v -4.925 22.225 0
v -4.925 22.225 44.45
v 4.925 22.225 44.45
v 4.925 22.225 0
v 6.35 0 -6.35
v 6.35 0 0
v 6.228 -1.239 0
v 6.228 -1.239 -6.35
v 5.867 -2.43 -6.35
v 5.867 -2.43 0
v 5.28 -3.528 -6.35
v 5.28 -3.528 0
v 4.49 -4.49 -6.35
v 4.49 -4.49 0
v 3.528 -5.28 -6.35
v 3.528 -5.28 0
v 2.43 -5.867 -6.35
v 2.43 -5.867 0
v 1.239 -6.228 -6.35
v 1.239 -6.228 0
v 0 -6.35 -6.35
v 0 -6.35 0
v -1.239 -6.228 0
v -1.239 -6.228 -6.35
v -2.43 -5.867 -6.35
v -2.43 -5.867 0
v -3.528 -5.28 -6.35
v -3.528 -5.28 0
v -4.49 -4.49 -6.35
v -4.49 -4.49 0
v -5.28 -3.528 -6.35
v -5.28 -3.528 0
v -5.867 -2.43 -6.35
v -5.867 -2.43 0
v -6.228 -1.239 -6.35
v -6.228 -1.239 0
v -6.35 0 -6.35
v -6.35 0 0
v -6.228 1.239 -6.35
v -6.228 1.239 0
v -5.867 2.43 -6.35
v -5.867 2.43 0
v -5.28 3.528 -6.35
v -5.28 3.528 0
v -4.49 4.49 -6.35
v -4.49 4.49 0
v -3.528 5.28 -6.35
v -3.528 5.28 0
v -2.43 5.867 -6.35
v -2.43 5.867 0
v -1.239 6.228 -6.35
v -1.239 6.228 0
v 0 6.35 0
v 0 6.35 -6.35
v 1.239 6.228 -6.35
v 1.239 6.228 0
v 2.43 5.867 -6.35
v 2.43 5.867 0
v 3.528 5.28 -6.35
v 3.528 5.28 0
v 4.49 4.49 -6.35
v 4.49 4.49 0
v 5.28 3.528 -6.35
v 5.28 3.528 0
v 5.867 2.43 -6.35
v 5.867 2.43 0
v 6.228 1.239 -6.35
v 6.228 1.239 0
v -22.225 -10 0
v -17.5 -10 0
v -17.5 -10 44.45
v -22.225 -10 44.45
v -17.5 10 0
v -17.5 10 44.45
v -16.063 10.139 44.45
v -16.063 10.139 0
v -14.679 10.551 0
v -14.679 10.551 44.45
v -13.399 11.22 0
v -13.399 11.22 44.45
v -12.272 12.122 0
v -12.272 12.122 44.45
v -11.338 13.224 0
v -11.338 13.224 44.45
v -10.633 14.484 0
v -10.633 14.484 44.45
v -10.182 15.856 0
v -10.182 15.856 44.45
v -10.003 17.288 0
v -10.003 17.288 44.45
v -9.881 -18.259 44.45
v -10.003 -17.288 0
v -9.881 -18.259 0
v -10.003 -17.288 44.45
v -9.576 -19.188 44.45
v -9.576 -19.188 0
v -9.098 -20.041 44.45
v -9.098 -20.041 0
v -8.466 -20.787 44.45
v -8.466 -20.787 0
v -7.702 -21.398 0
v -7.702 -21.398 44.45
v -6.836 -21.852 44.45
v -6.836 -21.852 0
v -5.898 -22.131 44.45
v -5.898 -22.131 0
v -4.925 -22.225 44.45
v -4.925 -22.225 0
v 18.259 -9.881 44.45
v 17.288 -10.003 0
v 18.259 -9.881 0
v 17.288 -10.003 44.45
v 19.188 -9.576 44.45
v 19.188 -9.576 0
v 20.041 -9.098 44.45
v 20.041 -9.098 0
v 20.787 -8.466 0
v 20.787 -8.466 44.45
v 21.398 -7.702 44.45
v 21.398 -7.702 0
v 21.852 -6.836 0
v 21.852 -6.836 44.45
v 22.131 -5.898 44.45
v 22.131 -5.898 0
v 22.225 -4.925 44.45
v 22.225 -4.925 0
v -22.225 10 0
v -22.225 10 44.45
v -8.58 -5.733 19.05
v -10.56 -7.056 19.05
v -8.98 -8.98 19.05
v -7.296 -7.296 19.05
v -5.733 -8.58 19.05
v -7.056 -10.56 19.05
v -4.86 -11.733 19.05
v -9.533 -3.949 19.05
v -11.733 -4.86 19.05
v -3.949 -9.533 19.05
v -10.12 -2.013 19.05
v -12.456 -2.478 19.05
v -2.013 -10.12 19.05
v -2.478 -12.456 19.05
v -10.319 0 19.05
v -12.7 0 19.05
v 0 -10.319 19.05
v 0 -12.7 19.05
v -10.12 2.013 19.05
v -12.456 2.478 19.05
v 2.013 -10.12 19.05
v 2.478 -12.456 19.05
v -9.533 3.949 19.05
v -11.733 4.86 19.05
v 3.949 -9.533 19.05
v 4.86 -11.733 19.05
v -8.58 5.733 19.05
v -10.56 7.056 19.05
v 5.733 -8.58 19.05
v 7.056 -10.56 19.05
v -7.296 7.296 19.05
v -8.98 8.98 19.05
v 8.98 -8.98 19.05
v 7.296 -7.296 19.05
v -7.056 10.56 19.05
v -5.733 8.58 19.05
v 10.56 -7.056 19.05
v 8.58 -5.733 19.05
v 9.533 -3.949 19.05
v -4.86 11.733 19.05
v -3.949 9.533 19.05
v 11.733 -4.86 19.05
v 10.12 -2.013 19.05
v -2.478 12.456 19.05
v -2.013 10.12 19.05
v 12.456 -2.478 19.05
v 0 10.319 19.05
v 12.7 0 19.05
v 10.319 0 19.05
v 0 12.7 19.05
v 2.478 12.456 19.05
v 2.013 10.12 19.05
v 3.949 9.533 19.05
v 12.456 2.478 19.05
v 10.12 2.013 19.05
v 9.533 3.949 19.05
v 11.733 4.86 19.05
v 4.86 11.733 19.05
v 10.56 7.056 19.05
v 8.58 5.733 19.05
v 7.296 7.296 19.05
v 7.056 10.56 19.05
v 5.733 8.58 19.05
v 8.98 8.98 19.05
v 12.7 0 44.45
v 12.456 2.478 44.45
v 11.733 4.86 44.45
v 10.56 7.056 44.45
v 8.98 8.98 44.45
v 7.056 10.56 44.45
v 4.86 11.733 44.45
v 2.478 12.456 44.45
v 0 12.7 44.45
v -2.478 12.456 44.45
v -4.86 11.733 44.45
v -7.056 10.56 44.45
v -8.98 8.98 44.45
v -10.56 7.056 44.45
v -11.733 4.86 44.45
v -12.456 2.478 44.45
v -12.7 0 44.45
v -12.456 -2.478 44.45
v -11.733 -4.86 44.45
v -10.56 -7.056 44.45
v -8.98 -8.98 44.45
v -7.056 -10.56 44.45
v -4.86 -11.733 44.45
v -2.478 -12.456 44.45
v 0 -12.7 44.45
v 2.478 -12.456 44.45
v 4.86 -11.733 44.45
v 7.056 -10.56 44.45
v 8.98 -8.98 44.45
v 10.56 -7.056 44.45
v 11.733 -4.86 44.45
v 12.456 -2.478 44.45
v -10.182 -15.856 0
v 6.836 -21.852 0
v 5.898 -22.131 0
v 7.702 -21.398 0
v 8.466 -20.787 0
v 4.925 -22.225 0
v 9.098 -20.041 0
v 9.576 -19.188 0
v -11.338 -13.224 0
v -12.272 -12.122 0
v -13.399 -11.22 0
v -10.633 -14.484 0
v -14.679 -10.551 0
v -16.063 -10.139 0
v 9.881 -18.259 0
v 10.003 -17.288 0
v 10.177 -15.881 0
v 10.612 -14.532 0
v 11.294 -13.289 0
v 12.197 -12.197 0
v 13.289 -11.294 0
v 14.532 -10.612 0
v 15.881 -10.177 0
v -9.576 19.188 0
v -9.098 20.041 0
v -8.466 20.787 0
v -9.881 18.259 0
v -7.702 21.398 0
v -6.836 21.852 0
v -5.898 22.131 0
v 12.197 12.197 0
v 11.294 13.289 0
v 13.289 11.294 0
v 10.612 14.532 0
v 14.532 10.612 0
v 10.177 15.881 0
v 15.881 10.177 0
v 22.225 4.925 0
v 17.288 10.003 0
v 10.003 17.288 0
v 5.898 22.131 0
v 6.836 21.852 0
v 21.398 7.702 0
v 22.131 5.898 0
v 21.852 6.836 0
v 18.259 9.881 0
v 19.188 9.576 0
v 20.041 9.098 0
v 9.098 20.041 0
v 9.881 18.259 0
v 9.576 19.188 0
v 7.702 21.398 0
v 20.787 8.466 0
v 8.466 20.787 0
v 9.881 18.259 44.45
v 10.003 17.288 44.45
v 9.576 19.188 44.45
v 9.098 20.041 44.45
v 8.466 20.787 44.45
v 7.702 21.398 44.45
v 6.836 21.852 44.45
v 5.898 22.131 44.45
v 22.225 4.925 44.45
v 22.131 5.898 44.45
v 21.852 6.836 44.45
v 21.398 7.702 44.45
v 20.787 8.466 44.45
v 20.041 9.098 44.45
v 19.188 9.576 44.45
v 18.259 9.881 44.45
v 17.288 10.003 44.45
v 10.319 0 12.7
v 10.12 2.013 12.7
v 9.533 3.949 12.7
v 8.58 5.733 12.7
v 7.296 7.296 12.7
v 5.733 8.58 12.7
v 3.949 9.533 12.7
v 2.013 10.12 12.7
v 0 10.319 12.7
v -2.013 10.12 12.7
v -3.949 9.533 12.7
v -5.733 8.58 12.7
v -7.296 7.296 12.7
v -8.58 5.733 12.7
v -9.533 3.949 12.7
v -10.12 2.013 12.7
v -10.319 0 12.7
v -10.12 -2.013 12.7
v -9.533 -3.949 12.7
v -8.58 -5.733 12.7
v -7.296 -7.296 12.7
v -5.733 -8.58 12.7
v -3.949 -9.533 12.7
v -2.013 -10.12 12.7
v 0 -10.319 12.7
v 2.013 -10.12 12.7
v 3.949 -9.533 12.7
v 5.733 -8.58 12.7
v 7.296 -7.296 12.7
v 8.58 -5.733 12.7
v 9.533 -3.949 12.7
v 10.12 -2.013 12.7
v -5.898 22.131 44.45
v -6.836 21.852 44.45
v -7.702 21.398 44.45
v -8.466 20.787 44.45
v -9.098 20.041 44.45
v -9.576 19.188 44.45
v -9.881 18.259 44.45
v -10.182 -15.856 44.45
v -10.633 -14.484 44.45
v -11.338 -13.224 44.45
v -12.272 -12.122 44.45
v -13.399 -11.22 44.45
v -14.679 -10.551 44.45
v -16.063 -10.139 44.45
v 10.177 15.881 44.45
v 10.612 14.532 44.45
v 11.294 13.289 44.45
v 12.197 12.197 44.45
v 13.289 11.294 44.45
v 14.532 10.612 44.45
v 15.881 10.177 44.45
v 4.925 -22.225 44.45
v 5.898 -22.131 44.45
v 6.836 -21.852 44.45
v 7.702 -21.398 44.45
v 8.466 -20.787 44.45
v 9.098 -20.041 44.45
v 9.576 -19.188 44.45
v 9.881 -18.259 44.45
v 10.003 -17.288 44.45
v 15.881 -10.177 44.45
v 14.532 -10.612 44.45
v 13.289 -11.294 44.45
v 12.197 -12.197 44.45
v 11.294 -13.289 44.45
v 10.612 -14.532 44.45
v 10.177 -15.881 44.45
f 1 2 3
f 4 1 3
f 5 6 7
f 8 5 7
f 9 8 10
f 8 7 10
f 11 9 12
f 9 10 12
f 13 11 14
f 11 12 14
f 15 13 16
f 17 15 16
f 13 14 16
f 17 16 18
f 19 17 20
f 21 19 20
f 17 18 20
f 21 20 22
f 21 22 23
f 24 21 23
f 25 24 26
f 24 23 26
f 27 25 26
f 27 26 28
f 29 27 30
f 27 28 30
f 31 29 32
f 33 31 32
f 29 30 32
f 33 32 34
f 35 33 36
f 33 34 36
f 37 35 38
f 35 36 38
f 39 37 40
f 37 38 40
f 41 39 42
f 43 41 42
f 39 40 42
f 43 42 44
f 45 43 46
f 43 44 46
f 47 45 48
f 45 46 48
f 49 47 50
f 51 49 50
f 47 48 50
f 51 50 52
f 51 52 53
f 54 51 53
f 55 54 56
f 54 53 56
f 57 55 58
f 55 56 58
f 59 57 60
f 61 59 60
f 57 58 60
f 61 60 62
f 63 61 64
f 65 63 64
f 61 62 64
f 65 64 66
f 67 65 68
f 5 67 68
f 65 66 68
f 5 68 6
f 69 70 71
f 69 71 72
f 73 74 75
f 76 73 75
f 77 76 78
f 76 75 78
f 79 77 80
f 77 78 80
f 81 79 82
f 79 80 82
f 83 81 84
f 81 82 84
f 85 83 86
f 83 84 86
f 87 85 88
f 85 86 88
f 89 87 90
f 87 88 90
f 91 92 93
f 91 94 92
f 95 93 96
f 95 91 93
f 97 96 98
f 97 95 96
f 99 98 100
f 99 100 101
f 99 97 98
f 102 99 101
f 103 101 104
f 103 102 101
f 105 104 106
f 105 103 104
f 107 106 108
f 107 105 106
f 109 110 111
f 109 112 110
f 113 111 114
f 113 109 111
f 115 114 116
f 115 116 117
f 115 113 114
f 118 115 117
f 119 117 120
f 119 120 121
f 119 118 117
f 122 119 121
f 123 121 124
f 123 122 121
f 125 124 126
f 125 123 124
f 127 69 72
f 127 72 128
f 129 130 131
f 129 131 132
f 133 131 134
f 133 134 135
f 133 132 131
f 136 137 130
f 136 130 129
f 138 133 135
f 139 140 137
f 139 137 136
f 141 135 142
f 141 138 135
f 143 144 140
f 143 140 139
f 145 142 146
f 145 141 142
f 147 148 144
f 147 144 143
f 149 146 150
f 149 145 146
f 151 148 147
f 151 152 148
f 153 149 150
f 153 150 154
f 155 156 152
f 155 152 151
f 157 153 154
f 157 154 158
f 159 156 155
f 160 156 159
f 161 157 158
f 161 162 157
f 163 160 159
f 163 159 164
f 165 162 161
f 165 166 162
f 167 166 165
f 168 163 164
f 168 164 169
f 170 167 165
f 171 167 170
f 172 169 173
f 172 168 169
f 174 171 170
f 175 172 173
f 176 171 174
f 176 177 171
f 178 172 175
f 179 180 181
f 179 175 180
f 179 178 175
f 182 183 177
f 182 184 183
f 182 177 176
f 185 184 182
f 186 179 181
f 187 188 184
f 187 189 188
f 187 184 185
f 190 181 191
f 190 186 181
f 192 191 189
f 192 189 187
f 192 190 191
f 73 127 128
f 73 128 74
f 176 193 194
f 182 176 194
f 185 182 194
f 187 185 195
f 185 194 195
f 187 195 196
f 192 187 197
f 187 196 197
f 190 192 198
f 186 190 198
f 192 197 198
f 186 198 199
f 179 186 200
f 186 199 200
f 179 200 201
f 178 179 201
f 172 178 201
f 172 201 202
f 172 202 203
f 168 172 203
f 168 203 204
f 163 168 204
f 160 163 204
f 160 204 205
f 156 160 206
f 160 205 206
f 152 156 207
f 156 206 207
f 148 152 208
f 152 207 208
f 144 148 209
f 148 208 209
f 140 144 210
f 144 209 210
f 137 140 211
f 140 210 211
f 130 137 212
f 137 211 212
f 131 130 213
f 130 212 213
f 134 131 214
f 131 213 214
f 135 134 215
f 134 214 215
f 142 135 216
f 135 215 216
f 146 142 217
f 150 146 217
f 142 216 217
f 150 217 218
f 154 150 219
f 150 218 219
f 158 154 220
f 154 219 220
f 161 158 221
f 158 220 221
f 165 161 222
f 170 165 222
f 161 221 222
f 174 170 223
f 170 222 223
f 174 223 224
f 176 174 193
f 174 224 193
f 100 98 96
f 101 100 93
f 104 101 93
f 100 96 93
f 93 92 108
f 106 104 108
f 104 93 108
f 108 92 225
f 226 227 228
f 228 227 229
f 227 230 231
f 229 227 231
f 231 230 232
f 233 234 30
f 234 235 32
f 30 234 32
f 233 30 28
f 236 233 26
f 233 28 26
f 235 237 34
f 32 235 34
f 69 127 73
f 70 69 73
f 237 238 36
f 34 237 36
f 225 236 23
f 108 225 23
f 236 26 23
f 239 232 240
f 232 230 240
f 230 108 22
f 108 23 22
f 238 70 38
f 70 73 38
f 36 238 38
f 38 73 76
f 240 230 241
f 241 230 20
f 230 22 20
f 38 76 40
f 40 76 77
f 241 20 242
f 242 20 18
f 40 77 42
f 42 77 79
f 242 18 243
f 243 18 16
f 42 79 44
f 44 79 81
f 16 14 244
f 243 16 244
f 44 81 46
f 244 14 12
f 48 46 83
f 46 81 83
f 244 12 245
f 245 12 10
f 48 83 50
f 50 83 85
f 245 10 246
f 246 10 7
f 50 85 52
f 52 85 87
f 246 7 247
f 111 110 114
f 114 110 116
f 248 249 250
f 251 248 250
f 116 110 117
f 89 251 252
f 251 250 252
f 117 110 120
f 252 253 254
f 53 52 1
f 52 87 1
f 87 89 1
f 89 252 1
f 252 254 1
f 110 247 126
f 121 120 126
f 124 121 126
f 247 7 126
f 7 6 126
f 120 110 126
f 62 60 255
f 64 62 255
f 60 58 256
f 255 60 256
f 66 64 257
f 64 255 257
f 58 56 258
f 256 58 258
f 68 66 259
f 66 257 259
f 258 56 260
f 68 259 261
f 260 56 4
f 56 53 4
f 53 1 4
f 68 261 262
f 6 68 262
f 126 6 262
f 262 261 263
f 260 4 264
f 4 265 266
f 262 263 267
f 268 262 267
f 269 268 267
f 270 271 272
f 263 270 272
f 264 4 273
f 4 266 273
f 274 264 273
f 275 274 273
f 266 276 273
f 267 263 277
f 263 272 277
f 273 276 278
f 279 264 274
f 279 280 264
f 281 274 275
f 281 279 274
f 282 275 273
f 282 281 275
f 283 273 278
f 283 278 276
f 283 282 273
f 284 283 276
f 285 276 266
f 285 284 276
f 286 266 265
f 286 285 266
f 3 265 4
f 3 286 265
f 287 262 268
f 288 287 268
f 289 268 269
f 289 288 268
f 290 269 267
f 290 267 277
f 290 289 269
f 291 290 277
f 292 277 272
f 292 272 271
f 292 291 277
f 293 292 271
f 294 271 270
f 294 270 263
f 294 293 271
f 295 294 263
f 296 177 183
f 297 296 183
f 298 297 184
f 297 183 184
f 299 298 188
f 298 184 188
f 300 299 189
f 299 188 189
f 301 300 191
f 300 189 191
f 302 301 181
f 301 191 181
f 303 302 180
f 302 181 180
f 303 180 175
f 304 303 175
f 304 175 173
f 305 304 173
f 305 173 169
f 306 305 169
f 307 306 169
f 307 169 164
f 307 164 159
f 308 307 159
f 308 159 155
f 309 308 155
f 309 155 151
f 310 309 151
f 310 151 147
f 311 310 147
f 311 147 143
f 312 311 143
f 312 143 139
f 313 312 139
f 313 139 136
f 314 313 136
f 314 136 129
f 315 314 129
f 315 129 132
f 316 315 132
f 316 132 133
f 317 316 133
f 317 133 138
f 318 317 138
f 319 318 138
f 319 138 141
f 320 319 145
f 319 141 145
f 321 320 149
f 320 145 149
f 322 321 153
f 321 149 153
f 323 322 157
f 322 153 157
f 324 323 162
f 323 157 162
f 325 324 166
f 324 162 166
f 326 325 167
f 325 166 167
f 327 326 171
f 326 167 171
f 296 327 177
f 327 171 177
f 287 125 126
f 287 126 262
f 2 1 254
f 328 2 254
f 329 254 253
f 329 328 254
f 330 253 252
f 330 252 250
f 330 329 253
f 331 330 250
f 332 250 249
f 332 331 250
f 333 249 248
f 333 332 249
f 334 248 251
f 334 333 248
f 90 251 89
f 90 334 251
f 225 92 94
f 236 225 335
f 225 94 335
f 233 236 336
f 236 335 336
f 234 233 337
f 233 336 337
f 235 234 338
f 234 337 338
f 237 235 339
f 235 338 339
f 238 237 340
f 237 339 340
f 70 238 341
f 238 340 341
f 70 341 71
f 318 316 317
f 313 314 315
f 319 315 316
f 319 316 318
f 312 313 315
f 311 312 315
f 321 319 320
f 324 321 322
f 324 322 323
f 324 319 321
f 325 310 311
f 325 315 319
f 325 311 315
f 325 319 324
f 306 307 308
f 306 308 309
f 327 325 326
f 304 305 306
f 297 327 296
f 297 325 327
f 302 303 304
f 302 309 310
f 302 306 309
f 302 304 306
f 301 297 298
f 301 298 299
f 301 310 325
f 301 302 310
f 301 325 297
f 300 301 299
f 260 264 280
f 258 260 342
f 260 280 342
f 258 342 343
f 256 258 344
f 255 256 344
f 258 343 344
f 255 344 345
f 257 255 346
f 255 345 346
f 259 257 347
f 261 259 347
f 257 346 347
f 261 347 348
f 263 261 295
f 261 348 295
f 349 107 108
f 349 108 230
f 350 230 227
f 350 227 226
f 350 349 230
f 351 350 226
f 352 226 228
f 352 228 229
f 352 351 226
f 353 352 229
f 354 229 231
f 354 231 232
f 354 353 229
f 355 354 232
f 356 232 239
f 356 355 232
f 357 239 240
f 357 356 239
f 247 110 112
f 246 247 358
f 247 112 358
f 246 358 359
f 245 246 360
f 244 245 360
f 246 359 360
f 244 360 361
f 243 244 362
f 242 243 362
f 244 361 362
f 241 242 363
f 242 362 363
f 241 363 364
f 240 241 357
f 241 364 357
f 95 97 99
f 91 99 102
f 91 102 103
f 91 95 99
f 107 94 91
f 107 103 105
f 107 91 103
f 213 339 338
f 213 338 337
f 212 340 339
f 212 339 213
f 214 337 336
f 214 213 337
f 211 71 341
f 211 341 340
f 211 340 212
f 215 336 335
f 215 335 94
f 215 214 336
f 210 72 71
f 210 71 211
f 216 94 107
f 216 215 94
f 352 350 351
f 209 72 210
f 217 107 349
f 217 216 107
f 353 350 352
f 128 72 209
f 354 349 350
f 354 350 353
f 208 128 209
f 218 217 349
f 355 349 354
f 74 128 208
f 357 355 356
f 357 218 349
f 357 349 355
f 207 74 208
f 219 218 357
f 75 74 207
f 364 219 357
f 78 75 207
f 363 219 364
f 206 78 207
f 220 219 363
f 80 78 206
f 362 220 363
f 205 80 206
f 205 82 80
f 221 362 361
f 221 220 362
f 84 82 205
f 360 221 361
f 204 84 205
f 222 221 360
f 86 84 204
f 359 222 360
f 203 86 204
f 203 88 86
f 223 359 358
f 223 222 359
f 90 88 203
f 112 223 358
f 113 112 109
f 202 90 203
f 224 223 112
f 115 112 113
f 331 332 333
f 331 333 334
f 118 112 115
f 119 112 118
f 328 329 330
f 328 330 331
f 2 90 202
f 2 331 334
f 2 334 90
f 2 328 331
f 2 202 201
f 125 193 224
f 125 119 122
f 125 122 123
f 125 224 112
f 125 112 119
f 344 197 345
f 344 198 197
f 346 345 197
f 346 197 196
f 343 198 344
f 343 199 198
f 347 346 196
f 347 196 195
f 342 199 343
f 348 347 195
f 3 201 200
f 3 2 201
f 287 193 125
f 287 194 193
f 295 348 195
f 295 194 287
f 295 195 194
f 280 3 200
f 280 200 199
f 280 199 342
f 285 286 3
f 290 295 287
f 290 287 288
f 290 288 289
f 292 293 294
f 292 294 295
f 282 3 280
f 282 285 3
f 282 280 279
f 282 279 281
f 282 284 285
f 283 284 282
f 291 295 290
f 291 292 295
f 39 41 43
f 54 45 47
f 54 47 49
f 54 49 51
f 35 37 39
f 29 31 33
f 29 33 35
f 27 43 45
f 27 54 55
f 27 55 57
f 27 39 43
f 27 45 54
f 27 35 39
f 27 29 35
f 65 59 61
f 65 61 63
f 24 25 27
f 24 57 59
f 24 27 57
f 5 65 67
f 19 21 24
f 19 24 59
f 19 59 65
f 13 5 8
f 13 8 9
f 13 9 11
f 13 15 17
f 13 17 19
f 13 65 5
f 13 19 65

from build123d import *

# Parameters (mm, degrees)
F0_W      = 44.45
F0_H      = 44.45
F1_DEPTH  = 44.45
F2_R      = 10.31875
F3_DEPTH  = 31.75
F4_R      = 7.5
F5_DEPTH  = 50.8
F6_R      = 5.08
F8_DEPTH  = 50.8
F9_R      = 6.35
F10_DEPTH = 6.35
F11_R     = 12.7
F12_DEPTH = 25.4


with BuildPart() as f1:
    # F0 (on Top) → F1 (new body)
    with BuildSketch(Plane.XY):
        Rectangle(F0_W, F0_H)
    extrude(amount=F1_DEPTH)

    # F2 (on face) → F3 (cut)
    with BuildSketch(Plane.XY.offset(44.45)):
        Circle(F2_R)
    extrude(amount=-F3_DEPTH, mode=Mode.SUBTRACT)

    # F4 (on face) → F5 (cut)
    with BuildSketch(Plane.XY.offset(44.45)):
        with Locations((-17.5, 17.5)):
            Circle(F4_R)
        with Locations((17.5, 17.5)):
            Circle(F4_R)
        with Locations((17.5, -17.5)):
            Circle(F4_R)
        with Locations((-17.5, -17.5)):
            Circle(F4_R)
    extrude(amount=-F5_DEPTH, mode=Mode.SUBTRACT)

    # F6
    f6_edges = [f1.edges().sort_by_distance(p)[0] for p in [
        (-11.675537, -22.225, 22.225),
        (11.675537, -22.225, 22.225),
        (22.225, -11.675537, 22.225),
        (-11.675537, 22.225, 22.225),
        (11.675537, 22.225, 22.225),
        (22.225, 11.675537, 22.225),
    ]]
    fillet(f6_edges, radius=F6_R)

    # F7 (on face) → F8 (cut)
    with BuildSketch(Plane.XY.offset(44.45)):
        Polygon((-22.225, 10), (-17.5, 10), (-22.225, 11.6755365054), align=None)
        Polygon((-22.225, -12.5695262104), (-17.5, -10), (-22.225, -10), align=None)
    extrude(amount=-F8_DEPTH, mode=Mode.SUBTRACT)

    # F9 (on face) → F10 (join)
    with BuildSketch(Plane(origin=(0, 0, 0), x_dir=(1, 0, 0), z_dir=(0, 0, -1))):
        Circle(F9_R)
    extrude(amount=F10_DEPTH)

    # F11 (on face) → F12 (cut)
    with BuildSketch(Plane.XY.offset(44.45)):
        Circle(F11_R)
    extrude(amount=-F12_DEPTH, mode=Mode.SUBTRACT)


solid = f1.part
